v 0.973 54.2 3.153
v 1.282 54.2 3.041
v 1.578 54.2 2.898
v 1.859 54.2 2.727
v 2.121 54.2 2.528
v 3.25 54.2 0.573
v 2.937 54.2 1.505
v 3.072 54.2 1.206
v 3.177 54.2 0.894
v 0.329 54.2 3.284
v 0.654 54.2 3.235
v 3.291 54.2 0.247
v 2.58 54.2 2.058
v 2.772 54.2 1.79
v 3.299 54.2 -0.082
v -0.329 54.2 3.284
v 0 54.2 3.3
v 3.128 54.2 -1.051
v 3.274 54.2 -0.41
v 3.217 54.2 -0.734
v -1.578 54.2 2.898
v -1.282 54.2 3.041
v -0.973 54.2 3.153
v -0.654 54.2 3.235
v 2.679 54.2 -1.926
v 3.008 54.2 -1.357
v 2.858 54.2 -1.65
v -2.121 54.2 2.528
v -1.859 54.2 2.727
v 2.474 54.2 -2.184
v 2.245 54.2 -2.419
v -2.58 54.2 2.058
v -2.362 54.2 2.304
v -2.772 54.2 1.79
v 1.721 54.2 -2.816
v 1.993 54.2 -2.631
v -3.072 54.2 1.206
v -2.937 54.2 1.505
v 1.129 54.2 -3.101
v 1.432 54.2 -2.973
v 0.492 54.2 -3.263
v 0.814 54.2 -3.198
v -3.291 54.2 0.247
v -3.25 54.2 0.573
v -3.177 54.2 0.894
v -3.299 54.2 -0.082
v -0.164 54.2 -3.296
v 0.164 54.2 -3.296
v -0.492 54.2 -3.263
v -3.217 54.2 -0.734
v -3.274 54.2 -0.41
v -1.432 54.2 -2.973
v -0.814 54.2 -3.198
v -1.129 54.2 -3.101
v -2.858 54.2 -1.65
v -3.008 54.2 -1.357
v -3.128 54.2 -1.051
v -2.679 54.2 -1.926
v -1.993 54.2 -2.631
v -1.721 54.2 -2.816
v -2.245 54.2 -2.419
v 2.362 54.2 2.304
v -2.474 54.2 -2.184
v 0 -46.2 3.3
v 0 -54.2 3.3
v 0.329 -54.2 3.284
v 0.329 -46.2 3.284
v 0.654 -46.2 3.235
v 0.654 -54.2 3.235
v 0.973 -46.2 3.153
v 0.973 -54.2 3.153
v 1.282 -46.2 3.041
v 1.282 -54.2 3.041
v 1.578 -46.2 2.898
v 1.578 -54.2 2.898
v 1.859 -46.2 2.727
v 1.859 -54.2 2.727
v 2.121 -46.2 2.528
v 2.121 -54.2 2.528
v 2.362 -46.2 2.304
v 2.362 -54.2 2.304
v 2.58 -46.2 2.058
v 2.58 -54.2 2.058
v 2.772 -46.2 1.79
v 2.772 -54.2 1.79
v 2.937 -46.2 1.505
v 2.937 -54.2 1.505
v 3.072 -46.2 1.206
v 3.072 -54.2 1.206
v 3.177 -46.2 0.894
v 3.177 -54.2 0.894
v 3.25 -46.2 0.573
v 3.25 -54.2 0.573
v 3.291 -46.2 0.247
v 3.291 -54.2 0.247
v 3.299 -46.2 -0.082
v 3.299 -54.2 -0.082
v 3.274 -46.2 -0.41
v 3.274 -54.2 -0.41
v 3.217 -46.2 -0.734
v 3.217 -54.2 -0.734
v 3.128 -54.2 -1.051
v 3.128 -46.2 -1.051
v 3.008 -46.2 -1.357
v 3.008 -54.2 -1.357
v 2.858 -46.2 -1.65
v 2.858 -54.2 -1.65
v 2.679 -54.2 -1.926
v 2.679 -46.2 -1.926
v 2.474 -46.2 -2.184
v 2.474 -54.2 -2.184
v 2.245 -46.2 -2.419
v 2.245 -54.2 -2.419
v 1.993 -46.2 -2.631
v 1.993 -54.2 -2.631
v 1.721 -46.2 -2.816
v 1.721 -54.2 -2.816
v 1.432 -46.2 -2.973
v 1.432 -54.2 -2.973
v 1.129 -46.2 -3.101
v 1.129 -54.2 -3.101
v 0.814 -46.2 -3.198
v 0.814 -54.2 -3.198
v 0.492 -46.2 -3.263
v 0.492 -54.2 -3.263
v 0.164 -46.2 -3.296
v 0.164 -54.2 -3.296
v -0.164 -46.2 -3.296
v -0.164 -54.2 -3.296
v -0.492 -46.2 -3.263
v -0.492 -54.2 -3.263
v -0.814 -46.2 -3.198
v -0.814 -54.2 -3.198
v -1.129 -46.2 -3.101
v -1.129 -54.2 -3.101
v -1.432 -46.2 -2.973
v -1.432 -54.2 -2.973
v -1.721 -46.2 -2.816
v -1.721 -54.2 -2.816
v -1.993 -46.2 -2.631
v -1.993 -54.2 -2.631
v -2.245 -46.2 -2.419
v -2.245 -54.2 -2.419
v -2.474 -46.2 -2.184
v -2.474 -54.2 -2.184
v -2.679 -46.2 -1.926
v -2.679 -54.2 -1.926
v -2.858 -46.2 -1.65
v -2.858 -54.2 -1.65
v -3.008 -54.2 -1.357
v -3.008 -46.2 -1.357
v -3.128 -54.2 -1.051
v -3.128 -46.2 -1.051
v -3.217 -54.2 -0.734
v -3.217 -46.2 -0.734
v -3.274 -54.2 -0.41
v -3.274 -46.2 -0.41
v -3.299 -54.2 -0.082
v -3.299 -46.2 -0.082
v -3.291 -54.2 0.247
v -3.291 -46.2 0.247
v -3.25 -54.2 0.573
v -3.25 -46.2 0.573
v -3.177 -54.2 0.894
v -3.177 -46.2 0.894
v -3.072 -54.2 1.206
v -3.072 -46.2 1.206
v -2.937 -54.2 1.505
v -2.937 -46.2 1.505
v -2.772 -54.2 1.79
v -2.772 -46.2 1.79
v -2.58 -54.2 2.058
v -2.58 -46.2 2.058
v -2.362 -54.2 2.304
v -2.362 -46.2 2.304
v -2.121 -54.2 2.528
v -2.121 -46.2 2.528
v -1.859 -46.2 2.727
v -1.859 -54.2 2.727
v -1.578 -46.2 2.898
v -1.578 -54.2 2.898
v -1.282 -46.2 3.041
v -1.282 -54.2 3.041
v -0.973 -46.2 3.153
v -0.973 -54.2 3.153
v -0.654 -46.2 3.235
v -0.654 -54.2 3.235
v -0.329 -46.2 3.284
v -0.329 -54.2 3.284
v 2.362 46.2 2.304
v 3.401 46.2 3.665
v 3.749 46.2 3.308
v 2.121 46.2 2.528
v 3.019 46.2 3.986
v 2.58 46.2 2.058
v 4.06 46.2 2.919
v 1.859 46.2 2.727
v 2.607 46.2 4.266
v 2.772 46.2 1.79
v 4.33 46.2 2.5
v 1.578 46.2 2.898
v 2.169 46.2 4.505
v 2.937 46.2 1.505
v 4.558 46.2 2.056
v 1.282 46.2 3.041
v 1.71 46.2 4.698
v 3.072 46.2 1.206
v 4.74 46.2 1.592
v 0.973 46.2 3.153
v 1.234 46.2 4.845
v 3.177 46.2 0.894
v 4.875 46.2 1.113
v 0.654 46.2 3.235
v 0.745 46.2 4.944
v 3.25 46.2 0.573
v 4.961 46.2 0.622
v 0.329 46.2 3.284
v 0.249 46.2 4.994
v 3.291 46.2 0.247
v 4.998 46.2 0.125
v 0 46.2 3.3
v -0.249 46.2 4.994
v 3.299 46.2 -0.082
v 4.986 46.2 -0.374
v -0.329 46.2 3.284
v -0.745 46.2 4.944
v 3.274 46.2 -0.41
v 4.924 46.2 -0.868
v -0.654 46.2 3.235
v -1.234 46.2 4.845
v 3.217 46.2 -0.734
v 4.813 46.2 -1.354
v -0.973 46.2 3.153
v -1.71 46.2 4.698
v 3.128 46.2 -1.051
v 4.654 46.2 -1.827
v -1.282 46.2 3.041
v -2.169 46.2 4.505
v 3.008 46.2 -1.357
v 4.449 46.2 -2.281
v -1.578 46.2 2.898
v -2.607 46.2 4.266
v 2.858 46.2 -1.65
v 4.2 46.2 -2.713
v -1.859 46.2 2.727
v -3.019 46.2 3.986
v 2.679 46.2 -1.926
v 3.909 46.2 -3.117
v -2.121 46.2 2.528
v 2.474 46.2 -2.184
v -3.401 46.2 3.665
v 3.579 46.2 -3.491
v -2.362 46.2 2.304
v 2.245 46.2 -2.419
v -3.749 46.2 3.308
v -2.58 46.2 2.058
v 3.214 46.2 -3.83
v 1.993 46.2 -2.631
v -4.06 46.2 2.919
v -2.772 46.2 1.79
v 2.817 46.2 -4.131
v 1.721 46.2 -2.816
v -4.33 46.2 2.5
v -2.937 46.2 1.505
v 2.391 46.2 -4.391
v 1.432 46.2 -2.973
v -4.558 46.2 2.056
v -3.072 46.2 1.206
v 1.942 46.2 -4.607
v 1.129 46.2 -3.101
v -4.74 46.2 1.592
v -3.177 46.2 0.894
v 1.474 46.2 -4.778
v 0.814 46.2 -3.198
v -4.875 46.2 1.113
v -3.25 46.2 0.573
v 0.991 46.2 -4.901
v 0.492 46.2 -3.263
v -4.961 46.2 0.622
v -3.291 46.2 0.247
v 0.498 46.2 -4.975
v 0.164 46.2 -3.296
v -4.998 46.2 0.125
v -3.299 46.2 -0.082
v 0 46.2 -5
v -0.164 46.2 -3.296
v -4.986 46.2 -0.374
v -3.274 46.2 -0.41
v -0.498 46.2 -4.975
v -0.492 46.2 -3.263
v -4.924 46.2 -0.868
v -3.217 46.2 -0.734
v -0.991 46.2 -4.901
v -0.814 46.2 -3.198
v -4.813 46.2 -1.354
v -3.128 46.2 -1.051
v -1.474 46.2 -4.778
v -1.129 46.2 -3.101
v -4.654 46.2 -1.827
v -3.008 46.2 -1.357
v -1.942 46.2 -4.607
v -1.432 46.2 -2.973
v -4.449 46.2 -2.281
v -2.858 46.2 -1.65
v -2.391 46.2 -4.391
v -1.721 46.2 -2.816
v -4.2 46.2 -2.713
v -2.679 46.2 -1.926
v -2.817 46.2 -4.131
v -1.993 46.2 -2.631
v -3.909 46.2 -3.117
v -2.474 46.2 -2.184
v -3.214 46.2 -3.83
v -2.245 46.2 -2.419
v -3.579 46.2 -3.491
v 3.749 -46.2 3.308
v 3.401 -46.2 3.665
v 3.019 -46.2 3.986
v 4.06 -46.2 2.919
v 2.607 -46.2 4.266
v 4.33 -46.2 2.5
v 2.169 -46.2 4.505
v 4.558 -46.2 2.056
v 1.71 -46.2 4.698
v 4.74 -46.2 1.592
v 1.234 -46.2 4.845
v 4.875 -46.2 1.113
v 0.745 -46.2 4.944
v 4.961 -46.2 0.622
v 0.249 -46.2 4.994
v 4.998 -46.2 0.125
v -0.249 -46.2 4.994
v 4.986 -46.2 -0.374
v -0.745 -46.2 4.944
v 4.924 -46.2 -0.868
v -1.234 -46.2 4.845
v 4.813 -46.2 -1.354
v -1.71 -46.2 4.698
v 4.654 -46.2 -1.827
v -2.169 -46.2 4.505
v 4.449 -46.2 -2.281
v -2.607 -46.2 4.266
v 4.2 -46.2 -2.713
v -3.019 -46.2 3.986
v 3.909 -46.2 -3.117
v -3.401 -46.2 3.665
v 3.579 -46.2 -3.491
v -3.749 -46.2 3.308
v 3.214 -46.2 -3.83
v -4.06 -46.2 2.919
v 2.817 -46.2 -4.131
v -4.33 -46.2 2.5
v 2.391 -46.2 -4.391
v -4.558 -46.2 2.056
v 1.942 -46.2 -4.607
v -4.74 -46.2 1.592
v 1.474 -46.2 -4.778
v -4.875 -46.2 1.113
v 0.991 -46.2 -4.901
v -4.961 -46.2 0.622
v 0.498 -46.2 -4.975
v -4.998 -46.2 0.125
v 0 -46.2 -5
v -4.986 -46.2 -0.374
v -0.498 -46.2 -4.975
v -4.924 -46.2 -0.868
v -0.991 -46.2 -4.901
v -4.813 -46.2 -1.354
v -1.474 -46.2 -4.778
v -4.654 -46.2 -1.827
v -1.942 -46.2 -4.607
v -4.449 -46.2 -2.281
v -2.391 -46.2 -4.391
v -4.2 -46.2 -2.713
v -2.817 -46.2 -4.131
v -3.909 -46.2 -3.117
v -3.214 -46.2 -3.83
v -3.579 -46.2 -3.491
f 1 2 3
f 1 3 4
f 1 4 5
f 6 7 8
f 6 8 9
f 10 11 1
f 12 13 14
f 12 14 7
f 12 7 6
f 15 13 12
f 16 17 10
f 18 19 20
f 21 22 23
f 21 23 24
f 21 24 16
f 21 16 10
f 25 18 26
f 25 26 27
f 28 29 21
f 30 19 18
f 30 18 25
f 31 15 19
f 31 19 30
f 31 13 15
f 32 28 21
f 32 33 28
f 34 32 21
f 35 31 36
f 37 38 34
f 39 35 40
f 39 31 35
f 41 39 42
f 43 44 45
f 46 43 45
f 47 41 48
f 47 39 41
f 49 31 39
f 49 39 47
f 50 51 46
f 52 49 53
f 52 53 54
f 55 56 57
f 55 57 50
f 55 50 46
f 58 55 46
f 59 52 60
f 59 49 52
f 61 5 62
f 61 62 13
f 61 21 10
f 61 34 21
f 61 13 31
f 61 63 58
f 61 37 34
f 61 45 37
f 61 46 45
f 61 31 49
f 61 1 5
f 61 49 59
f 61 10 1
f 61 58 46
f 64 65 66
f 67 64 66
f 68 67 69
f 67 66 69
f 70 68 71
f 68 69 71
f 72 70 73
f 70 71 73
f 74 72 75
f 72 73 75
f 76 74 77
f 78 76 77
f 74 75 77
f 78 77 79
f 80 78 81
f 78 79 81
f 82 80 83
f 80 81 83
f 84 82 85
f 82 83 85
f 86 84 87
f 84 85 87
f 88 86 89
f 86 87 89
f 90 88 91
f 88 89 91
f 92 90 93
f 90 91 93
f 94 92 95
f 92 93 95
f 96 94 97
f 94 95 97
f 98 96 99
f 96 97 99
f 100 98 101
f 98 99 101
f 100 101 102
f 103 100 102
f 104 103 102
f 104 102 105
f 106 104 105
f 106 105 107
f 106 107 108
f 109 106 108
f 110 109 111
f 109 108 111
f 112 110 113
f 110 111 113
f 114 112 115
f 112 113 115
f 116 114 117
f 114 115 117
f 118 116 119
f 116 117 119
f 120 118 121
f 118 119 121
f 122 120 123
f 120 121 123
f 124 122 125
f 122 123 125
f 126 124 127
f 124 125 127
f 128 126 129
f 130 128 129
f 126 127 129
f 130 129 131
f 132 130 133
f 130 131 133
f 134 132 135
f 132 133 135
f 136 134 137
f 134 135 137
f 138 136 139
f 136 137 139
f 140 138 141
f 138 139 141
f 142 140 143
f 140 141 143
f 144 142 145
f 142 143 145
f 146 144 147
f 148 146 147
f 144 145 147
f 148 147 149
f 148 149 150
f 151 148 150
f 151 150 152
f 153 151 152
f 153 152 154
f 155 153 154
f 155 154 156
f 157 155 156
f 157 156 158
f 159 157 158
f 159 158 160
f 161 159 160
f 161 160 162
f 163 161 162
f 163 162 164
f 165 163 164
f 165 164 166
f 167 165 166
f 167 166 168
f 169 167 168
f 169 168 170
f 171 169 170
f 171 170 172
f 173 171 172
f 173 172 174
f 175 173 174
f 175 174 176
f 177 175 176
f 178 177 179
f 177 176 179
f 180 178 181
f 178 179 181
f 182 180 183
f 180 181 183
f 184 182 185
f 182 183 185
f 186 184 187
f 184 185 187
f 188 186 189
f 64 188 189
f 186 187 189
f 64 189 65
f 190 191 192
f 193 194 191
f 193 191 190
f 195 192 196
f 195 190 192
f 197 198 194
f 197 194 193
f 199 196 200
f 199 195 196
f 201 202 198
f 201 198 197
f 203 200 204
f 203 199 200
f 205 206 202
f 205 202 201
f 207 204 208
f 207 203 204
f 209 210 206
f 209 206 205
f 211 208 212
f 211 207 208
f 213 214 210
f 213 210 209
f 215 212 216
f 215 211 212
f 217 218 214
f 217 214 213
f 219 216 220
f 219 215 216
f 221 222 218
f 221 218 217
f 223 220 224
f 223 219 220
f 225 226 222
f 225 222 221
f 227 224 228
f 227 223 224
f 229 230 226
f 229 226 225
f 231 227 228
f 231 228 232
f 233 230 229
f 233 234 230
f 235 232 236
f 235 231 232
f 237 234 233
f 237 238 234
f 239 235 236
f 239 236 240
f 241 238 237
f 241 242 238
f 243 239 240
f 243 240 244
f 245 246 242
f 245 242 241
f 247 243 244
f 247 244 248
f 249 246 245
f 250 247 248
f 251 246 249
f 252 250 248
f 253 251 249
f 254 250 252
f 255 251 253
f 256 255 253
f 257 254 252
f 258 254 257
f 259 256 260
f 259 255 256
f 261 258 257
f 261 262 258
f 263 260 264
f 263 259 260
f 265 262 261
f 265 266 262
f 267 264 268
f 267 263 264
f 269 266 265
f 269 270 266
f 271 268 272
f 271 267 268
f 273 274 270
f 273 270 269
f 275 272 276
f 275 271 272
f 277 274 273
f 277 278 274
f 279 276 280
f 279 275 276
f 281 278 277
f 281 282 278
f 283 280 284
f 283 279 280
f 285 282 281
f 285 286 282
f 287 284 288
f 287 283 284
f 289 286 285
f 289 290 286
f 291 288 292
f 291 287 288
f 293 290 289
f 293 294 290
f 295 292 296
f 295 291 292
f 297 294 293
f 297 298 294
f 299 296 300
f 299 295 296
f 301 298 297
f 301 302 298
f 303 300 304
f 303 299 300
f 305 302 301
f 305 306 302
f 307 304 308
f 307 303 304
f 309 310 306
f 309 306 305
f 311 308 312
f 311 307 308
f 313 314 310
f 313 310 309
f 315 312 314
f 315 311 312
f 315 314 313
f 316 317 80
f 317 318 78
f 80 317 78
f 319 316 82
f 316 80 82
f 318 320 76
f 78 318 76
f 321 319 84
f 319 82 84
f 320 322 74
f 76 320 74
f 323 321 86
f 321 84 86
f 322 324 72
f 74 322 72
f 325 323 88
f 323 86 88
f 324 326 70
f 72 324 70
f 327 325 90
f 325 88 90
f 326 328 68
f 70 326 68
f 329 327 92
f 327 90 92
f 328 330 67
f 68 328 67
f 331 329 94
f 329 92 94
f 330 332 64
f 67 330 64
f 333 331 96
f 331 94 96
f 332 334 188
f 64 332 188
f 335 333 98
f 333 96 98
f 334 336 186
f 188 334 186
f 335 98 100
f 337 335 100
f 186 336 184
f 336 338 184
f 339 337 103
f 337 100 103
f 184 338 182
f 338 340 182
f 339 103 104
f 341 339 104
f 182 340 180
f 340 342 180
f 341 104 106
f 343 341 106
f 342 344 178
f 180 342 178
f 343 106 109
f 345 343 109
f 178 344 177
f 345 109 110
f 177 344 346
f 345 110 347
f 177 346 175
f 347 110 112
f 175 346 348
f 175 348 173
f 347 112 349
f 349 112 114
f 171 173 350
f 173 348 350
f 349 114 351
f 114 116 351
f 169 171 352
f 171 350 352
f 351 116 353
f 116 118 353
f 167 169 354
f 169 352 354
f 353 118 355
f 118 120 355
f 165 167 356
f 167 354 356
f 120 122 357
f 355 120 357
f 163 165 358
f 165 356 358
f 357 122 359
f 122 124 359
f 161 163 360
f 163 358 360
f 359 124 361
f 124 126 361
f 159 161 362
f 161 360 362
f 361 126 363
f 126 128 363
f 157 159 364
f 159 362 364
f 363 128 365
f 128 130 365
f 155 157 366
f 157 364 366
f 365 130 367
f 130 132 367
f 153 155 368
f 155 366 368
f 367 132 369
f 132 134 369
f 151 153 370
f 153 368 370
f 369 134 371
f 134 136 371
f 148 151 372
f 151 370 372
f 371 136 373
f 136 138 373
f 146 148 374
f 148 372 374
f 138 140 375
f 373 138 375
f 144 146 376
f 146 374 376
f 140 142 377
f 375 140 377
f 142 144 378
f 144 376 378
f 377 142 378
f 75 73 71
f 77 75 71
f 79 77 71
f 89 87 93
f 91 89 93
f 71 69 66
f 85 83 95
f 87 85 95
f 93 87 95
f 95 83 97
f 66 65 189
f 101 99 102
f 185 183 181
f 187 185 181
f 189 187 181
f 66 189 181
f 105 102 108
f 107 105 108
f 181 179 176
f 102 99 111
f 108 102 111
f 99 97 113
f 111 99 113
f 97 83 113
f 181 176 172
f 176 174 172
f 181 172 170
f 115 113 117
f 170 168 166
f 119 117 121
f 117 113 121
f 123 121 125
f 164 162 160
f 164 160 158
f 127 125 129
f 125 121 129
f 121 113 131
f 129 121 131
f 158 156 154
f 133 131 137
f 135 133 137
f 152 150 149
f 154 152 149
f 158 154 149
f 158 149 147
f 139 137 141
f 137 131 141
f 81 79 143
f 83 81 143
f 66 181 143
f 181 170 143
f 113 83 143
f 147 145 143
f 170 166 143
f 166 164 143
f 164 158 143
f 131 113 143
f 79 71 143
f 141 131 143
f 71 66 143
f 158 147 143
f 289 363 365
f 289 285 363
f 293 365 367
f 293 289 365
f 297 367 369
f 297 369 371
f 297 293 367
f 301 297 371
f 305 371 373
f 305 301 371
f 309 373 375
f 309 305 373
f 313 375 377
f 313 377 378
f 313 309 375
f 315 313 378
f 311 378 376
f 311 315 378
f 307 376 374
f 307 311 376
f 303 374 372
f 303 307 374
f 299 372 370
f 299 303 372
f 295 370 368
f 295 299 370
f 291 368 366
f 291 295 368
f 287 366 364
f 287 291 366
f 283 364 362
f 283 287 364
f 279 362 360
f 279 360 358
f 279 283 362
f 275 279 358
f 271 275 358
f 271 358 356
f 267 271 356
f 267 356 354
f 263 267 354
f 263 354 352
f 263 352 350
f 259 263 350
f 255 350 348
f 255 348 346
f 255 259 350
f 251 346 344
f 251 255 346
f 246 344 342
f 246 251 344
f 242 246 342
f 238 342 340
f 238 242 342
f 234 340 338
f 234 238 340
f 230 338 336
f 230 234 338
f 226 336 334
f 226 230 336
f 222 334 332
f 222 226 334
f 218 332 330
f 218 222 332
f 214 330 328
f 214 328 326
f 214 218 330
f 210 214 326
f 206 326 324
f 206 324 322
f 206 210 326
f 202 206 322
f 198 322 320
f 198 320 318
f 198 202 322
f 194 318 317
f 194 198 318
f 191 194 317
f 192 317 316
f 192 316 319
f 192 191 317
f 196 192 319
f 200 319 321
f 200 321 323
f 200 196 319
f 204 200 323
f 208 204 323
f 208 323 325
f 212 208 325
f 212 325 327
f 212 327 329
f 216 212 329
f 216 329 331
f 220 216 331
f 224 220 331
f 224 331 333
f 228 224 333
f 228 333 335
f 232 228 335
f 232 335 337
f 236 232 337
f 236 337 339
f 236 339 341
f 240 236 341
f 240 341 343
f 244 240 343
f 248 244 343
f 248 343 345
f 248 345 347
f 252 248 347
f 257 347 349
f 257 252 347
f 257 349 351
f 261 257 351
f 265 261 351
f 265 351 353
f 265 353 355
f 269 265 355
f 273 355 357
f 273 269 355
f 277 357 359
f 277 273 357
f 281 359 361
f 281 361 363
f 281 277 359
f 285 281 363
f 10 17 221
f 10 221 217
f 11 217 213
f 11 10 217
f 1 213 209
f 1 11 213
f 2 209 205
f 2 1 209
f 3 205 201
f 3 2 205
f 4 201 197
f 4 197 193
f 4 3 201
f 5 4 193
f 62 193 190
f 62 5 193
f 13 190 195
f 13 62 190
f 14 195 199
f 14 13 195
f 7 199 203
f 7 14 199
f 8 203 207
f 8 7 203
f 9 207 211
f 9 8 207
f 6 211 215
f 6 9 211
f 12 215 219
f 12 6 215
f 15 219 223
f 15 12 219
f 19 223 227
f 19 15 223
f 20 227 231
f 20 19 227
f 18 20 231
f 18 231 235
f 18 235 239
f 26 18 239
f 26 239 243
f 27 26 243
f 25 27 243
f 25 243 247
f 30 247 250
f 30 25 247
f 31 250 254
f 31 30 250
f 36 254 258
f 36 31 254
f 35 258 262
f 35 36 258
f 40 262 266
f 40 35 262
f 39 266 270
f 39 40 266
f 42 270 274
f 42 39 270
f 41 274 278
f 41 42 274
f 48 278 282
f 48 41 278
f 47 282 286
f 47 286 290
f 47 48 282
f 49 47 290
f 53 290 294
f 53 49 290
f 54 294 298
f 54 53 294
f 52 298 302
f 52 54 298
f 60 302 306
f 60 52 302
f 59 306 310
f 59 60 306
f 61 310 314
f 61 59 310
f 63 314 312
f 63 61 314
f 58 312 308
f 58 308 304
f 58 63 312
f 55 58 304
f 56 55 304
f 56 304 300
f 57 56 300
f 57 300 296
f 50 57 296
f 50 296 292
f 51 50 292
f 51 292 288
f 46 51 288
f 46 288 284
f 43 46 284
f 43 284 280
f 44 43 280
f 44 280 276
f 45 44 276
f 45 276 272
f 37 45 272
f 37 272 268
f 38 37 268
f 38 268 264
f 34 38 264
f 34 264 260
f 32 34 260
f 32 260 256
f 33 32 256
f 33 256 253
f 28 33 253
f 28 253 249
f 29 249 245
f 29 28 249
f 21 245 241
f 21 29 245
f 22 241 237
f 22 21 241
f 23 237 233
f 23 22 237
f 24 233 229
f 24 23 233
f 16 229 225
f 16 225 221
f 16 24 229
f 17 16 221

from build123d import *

# Parameters (mm, degrees)
ESBO_O1_R                = 5
RESSALTO_EXTRUS_O1_DEPTH = 54.2
ESBO_O2_R                = 5
ESBO_O2_R_2              = 3.3
CORTE_EXTRUS_O1_DEPTH    = 8


with BuildPart() as part:
    # Esboço1 → Ressalto-extrusão1 (new, symmetric)
    with BuildSketch(Plane(origin=(0, 0, 0), x_dir=(1, 0, 0), z_dir=(0, 1, 0))):
        with Locations(Location((0, 0, 0), (0, 0, 90))):
            Circle(ESBO_O1_R)
    extrude(amount=RESSALTO_EXTRUS_O1_DEPTH, both=True)

    # Esboço2 → Corte-extrusão1 (cut)
    with BuildSketch(Plane(origin=(0, 54.2, 0), x_dir=(1, 0, 0), z_dir=(0, 1, 0))):
        with Locations(Location((0, 0, 0), (0, 0, 90))):
            Circle(ESBO_O2_R)
        with Locations(Location((0, 0, 0), (0, 0, 270))):
            Circle(ESBO_O2_R_2, mode=Mode.SUBTRACT)
    corte_extrus_o1 = extrude(amount=-CORTE_EXTRUS_O1_DEPTH, mode=Mode.SUBTRACT)

    # Espelhar1: Corte-extrusão1 across plane
    add(corte_extrus_o1.mirror(Plane.ZX), mode=Mode.SUBTRACT)


solid = part.part
